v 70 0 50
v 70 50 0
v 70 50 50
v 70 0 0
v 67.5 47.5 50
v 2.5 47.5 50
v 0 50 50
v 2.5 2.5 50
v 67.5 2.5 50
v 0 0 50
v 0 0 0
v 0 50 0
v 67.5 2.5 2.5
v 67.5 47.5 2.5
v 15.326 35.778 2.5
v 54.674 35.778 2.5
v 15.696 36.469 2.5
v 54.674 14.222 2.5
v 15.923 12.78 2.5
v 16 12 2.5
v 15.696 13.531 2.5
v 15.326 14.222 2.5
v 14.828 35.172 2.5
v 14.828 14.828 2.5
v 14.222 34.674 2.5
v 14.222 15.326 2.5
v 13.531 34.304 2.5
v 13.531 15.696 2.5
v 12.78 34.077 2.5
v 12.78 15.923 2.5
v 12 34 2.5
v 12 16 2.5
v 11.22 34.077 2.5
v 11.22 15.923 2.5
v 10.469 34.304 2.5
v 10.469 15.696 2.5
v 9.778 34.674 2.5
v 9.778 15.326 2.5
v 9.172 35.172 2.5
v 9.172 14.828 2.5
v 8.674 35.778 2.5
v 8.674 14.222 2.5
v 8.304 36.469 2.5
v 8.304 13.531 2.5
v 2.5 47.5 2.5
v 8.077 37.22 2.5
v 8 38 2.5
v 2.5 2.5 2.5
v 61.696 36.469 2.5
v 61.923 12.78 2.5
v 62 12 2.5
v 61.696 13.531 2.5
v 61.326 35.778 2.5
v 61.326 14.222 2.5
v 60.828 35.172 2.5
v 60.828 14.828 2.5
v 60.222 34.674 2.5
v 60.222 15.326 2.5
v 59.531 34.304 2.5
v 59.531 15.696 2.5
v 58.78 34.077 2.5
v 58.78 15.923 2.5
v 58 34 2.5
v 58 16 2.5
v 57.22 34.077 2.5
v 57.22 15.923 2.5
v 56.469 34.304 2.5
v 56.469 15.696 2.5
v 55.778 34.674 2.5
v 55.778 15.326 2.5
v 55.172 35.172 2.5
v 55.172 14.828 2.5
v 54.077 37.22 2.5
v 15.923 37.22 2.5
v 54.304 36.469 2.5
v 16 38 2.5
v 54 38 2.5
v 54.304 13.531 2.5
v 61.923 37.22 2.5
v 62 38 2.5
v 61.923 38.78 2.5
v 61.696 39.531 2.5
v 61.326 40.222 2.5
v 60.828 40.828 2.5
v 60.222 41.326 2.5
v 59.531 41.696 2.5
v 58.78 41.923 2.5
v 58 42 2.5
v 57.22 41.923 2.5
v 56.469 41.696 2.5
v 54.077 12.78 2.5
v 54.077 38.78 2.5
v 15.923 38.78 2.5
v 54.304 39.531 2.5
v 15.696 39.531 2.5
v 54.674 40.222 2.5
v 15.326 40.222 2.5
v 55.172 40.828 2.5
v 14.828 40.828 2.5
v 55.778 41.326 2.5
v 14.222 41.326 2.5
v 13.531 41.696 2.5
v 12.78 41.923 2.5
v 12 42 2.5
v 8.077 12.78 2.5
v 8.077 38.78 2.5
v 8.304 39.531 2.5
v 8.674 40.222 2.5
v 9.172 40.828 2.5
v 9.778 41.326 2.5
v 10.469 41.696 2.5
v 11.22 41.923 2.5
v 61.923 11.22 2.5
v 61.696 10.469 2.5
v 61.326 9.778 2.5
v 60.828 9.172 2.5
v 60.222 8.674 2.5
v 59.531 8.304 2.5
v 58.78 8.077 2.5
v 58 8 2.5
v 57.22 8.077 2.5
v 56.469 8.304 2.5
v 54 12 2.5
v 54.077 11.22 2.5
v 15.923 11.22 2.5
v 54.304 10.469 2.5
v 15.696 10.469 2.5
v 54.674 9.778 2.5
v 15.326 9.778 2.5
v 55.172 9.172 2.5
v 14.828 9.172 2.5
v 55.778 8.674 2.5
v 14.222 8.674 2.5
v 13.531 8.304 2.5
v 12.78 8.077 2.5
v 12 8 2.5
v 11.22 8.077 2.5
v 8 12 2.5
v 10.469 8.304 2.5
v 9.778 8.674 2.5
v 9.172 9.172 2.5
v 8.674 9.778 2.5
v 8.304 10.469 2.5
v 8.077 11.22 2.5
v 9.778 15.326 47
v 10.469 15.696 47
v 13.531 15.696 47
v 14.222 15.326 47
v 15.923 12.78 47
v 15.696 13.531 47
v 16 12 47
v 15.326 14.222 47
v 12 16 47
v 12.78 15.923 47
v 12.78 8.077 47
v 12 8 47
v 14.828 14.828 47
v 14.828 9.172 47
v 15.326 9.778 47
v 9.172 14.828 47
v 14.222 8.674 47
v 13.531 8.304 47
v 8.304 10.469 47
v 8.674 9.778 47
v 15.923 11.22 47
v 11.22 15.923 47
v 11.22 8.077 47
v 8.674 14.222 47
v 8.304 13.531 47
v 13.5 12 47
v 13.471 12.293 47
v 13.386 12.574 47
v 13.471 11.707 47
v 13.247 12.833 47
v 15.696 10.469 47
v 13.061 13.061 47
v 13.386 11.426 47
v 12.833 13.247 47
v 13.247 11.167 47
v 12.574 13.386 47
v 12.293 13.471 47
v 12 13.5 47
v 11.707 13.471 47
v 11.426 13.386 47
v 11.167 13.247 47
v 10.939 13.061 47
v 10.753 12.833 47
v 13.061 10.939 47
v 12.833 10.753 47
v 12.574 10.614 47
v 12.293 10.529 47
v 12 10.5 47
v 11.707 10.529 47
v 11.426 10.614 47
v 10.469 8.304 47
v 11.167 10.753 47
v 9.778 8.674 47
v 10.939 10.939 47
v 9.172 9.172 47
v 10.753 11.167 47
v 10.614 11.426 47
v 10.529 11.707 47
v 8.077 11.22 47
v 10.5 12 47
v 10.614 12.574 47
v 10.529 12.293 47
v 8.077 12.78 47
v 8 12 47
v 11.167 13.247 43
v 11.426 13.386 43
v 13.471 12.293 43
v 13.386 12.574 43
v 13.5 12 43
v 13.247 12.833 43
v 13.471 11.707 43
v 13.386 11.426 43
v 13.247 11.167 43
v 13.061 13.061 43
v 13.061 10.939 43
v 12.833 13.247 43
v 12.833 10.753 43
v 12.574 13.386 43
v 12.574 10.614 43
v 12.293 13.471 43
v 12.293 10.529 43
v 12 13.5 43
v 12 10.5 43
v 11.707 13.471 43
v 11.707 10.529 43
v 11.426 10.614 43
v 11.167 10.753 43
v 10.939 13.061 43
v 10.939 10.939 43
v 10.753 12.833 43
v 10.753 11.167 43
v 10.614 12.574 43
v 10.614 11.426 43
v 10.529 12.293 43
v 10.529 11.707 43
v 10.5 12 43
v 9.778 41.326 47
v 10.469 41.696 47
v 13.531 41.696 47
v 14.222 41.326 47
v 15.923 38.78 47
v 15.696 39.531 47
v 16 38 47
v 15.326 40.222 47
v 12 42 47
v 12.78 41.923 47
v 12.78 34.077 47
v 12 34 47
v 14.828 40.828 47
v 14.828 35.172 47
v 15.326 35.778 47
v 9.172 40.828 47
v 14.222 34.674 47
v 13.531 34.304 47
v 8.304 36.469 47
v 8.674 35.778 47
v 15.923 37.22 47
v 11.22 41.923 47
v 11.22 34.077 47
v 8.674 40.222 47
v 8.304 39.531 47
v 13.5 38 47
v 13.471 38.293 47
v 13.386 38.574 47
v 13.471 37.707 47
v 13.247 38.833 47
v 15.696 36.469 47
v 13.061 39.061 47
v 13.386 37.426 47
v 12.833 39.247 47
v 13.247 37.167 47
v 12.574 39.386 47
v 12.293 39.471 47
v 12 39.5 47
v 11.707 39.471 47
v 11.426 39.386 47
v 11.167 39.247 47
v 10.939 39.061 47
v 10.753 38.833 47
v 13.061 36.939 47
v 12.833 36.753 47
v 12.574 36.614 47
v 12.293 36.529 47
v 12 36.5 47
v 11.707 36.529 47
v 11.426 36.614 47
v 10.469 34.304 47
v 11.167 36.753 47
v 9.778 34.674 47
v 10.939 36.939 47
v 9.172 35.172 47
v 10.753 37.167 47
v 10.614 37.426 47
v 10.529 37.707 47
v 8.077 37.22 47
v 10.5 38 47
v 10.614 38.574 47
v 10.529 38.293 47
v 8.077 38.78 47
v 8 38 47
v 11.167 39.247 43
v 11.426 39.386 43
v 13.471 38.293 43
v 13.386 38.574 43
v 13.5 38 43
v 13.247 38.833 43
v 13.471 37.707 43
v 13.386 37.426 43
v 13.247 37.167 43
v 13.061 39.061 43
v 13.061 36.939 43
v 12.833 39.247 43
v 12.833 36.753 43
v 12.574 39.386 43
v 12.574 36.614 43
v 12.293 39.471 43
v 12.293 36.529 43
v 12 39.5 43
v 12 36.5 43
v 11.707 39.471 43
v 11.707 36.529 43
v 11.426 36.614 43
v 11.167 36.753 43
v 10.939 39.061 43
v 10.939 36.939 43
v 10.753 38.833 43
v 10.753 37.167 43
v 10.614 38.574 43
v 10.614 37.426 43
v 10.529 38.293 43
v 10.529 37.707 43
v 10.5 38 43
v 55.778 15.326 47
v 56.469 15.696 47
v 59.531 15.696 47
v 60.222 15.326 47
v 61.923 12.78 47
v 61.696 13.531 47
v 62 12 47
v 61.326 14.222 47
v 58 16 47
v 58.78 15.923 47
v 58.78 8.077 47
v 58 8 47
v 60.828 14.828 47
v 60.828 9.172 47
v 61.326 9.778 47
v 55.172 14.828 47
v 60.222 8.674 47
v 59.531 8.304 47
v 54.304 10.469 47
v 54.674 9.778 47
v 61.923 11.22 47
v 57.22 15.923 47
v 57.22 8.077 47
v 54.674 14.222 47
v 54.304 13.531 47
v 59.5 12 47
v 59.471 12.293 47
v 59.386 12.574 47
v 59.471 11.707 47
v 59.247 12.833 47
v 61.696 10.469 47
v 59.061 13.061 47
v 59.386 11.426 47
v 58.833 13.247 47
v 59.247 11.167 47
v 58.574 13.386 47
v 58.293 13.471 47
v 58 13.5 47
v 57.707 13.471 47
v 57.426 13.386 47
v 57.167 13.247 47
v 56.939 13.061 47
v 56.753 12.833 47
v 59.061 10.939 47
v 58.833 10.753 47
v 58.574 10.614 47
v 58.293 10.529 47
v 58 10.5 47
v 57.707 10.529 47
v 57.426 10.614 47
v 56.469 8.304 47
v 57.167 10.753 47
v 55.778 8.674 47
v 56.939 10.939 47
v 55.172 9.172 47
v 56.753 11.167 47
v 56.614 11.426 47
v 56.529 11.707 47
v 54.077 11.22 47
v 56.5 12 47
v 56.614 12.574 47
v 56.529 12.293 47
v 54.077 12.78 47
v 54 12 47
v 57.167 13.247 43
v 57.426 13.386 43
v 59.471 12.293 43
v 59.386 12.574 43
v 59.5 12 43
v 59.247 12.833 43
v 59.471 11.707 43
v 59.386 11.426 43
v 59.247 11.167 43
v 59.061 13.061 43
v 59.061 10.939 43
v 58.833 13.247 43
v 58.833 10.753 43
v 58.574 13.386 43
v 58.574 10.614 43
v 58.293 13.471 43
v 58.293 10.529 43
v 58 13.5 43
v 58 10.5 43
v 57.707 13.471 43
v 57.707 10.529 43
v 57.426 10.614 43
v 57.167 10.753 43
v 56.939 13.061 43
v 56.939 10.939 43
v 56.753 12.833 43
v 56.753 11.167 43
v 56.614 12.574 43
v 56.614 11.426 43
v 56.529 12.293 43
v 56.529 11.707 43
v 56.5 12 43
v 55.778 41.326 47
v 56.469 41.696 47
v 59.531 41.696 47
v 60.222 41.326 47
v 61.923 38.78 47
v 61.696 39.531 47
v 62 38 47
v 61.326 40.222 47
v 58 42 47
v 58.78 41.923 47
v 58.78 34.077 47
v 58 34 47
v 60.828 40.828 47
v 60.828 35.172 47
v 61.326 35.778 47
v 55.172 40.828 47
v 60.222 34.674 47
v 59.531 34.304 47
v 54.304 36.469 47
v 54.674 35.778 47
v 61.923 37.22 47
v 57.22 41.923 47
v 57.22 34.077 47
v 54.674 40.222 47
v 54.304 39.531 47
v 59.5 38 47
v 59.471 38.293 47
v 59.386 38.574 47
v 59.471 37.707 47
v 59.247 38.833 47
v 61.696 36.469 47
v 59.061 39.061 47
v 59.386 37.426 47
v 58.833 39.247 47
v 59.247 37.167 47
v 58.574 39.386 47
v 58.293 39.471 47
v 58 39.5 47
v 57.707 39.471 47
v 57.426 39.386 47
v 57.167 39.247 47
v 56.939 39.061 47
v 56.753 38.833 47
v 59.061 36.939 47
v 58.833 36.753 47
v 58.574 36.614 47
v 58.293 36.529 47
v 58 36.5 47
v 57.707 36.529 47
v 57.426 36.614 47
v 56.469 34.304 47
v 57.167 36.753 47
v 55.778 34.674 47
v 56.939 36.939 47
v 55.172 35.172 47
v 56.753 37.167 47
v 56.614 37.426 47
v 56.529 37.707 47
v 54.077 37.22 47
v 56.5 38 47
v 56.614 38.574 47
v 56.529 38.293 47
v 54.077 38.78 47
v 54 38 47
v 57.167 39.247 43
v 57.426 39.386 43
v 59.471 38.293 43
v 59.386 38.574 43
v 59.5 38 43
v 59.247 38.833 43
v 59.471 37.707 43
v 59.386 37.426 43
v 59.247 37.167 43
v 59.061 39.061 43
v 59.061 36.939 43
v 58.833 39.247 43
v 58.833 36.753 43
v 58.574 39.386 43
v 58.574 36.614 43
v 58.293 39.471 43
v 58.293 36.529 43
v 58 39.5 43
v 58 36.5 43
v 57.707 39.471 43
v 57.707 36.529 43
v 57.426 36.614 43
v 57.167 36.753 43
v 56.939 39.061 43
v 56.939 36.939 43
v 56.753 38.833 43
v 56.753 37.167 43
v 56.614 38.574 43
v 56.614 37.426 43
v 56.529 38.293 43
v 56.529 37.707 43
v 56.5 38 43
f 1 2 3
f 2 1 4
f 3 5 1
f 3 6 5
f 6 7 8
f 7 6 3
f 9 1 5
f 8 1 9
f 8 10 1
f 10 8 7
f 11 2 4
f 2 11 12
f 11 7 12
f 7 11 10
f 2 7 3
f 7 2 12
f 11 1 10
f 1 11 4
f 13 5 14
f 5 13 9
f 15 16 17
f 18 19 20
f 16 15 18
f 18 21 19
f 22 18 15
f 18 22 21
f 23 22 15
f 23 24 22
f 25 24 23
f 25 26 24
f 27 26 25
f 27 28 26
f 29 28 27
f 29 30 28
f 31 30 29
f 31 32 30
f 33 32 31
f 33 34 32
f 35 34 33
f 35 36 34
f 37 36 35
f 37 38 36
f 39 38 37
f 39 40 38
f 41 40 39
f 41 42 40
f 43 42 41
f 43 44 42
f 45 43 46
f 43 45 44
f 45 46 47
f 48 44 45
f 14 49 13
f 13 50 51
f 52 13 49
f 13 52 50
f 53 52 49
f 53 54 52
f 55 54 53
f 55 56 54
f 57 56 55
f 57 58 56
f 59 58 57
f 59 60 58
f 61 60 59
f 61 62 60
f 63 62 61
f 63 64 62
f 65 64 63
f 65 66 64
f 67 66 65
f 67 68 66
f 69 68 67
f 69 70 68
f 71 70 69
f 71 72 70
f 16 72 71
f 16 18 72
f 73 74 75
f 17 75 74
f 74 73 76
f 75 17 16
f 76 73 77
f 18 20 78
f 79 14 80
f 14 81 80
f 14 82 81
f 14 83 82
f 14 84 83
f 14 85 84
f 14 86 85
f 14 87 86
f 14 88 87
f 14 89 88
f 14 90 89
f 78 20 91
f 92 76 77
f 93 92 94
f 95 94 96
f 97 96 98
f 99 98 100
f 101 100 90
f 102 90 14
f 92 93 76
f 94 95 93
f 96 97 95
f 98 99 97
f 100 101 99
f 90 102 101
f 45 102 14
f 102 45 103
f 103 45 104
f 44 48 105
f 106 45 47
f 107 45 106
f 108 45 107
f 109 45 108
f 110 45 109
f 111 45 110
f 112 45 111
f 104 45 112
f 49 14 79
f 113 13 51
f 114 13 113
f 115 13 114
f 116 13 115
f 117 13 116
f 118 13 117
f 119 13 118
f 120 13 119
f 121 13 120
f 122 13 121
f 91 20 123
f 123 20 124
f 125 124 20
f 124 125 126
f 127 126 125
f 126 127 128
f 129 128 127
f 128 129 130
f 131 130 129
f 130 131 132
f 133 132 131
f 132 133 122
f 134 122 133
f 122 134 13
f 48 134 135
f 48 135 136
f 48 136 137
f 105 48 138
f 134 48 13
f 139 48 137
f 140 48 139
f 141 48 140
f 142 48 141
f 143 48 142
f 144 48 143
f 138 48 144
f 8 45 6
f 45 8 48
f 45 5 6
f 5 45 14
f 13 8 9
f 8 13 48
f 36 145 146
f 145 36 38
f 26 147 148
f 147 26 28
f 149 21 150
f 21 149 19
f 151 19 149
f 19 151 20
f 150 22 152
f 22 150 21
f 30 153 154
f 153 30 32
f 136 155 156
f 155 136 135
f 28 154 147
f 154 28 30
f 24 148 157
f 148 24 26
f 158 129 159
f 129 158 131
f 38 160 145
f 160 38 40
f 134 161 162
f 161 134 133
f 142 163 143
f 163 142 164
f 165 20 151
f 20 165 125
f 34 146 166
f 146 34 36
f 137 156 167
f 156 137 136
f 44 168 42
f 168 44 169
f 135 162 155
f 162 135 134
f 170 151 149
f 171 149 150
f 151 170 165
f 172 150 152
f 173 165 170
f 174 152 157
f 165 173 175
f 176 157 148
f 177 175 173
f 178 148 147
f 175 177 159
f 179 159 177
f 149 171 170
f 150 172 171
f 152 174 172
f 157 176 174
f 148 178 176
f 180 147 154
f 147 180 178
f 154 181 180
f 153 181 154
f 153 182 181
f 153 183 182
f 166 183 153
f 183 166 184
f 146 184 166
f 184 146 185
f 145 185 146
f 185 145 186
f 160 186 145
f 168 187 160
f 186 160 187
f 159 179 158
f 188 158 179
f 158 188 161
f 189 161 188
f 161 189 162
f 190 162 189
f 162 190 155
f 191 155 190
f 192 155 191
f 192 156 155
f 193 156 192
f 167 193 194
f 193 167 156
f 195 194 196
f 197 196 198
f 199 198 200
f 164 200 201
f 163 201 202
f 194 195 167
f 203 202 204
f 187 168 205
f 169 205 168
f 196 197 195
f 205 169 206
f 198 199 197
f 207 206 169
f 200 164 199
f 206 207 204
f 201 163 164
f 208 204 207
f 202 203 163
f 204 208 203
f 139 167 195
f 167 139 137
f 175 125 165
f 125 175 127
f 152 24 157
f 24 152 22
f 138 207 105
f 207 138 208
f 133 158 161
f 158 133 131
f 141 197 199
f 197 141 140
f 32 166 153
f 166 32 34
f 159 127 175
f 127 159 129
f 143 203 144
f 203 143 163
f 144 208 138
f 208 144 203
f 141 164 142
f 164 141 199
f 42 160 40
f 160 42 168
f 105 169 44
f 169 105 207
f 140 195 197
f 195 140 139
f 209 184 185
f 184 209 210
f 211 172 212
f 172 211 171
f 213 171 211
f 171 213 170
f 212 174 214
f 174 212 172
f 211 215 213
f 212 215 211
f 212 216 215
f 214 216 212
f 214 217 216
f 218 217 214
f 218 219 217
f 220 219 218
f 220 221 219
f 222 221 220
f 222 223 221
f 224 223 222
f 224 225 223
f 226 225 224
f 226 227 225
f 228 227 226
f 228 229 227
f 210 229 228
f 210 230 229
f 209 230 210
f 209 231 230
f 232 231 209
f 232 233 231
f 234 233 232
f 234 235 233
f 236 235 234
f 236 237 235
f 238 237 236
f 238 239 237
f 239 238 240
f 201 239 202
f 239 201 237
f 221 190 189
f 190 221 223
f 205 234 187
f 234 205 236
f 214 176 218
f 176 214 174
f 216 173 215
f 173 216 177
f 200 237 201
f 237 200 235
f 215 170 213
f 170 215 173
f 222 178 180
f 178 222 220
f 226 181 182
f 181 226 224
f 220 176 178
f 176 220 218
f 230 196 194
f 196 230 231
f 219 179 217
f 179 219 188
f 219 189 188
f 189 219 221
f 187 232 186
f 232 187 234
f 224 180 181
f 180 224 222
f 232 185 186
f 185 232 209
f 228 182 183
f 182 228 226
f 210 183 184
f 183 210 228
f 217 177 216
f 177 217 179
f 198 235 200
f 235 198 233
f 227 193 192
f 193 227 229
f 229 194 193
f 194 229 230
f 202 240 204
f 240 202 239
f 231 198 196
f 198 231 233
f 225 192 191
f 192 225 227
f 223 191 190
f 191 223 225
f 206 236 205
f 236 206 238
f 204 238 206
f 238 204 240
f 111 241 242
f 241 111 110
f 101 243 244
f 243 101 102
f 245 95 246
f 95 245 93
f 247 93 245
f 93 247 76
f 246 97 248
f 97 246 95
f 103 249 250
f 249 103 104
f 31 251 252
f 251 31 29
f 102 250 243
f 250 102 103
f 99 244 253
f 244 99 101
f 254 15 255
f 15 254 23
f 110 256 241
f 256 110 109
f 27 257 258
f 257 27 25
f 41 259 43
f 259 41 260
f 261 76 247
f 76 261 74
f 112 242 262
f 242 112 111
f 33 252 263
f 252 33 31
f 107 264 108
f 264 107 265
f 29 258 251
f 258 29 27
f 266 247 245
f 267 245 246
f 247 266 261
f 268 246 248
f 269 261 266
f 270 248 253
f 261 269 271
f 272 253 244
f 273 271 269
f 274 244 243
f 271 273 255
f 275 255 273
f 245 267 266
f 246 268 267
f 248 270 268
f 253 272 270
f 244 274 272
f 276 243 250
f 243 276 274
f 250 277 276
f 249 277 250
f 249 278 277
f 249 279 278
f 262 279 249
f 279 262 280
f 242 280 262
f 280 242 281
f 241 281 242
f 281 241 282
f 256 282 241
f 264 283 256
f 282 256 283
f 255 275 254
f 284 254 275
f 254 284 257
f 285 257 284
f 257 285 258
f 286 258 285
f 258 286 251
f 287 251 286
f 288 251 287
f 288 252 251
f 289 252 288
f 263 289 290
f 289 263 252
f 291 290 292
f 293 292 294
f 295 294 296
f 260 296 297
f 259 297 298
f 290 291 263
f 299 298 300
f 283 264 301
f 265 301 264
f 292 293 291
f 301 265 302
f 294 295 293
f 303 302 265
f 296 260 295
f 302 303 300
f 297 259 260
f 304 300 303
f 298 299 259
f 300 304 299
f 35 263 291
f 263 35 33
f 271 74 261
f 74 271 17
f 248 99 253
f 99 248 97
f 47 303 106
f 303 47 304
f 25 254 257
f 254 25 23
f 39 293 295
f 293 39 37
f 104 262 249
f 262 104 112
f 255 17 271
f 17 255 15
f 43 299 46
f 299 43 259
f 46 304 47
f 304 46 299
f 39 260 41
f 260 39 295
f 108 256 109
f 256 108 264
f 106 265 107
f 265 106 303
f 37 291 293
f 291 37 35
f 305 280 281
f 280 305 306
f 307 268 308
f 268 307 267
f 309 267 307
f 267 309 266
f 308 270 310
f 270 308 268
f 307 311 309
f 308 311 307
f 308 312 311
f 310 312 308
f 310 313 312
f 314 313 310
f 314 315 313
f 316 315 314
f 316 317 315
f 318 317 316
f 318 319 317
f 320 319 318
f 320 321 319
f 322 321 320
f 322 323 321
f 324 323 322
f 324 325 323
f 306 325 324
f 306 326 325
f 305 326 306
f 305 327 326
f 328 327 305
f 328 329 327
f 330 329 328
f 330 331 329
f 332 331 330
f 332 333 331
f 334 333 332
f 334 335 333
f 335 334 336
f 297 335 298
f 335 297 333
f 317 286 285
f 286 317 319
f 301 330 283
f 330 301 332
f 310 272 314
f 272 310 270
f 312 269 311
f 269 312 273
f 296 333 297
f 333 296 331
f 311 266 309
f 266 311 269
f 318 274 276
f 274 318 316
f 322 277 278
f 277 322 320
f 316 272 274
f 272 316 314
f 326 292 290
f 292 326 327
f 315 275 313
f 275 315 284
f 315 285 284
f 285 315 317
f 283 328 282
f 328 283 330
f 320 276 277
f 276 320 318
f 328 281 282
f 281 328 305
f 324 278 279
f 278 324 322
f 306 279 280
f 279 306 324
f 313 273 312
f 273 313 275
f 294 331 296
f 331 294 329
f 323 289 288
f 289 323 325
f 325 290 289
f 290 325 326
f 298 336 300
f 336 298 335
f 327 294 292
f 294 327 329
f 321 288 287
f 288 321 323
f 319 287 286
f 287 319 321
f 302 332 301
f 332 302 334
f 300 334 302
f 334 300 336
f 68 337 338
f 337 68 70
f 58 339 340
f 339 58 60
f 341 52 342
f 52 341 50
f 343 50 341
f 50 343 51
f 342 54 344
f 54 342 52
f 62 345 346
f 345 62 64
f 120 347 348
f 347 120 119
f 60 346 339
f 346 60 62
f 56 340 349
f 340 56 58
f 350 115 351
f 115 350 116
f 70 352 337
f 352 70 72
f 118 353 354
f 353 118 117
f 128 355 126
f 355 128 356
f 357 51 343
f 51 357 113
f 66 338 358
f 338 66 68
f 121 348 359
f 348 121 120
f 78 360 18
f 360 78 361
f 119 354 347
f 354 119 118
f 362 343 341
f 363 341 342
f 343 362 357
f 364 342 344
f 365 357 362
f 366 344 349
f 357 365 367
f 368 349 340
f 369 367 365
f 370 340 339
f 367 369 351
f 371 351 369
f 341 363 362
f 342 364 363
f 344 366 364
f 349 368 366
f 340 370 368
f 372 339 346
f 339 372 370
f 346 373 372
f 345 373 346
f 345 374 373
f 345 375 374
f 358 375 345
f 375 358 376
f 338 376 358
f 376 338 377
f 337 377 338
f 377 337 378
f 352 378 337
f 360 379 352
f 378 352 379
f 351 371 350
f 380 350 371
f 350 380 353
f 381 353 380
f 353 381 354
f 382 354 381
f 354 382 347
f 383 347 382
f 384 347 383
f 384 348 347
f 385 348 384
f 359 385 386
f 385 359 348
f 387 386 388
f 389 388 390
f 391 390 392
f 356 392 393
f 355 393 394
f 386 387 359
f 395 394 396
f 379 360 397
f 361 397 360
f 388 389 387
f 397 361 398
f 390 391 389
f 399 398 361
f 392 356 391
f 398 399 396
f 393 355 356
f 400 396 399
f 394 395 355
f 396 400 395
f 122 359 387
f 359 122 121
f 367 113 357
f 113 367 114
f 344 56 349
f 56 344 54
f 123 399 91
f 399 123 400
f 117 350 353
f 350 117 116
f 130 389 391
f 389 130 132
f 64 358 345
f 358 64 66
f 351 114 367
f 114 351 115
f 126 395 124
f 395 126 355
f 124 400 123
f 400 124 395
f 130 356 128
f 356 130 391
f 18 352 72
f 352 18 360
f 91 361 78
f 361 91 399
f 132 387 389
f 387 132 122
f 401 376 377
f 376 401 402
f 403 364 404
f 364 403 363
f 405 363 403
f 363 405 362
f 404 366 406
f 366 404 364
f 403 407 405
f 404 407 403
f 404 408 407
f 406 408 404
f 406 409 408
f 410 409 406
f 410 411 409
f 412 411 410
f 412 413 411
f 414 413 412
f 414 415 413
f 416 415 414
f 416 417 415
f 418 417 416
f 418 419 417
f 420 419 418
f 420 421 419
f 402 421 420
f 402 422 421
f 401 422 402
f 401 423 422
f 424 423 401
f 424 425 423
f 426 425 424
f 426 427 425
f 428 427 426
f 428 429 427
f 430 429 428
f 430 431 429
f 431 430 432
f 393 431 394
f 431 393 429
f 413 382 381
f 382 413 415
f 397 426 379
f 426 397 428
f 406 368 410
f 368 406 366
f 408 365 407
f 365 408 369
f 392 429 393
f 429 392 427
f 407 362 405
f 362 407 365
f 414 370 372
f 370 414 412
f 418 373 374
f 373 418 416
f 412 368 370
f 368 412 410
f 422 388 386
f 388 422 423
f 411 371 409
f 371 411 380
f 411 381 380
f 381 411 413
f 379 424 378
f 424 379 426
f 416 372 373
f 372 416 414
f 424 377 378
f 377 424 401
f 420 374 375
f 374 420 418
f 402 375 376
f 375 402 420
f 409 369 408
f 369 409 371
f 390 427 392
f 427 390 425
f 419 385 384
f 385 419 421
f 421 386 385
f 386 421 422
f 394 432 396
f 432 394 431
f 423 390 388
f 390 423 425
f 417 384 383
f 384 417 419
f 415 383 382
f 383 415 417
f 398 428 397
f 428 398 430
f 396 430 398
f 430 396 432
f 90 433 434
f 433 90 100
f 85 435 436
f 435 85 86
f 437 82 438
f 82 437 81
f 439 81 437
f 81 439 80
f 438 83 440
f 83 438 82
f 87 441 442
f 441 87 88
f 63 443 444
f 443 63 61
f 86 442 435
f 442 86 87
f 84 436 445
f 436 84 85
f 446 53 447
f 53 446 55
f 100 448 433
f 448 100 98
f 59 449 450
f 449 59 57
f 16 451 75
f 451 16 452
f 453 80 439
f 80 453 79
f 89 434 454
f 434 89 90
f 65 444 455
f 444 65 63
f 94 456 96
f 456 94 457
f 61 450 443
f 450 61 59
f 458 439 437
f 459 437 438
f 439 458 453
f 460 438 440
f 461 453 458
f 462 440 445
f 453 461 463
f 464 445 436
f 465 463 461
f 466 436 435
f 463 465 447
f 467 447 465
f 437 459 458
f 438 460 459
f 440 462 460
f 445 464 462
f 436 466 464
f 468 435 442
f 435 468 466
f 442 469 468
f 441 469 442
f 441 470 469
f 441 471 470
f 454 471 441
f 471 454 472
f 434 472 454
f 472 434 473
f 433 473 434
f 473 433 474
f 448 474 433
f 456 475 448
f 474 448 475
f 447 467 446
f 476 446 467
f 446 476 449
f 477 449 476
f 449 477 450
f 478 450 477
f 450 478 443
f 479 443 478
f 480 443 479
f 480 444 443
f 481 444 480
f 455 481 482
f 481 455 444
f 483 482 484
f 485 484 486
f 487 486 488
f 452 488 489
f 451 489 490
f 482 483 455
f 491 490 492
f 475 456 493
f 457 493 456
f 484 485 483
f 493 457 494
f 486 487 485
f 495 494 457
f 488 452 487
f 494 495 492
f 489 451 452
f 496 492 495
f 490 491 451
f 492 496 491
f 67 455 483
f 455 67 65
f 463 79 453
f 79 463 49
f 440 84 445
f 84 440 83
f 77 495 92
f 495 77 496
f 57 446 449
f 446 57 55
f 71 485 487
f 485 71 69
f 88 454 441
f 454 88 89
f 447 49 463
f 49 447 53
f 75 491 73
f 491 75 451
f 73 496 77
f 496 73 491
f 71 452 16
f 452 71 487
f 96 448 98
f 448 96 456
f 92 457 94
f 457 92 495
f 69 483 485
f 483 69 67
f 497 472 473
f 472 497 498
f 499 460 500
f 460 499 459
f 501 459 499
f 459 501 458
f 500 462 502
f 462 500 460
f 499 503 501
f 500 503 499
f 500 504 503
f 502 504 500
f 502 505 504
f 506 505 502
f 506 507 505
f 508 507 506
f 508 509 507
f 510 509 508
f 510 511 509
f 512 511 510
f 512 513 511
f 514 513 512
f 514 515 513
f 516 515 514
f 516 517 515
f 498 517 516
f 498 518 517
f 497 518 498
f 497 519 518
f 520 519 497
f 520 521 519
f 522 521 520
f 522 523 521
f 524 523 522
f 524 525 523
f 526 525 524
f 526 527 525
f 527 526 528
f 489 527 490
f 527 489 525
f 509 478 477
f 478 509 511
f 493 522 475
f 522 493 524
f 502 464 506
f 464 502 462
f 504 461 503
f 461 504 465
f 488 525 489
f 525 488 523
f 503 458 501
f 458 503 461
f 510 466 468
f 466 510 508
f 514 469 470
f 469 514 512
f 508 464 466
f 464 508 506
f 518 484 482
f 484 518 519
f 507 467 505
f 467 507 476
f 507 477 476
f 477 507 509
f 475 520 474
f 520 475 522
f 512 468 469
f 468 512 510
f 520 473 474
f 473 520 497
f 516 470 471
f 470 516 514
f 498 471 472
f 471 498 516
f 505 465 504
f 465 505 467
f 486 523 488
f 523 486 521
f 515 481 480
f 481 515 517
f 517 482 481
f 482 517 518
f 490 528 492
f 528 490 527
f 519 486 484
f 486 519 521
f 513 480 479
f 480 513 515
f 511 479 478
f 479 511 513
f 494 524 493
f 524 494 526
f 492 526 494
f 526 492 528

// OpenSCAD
$fn = 32;

// ----------------------------------------------------------------------
// Enclosure box: bosses enclosure
// ----------------------------------------------------------------------

// --- parameters (mm) ---
box_l = 70;               // outer length, X
box_w = 50;               // outer width, Y
box_h = 50;               // outer height
wall_t = 2.5;             // wall thickness
boss_r = 4;               // corner boss radius
hole_r = 1.5;             // boss screw hole radius
boss_in = 12;             // boss inset from the corners

inner_h = box_h - wall_t;  // cavity depth
boss_h = inner_h - 2;  // corner boss height

difference() {
  union() {
    difference() {
      cube([box_l, box_w, box_h]);
      translate([wall_t, wall_t, wall_t])
        cube([box_l - 2 * wall_t, box_w - 2 * wall_t, box_h]);
    }
    for (sx = [0, 1], sy = [0, 1])
      translate([sx ? box_l - boss_in : boss_in,
                 sy ? box_w - boss_in : boss_in, wall_t - 1])
        difference() {
          cylinder(r = boss_r, h = boss_h);
          translate([0, 0, boss_h - 4])
            cylinder(r = hole_r, h = 5);
        }
  }
}
